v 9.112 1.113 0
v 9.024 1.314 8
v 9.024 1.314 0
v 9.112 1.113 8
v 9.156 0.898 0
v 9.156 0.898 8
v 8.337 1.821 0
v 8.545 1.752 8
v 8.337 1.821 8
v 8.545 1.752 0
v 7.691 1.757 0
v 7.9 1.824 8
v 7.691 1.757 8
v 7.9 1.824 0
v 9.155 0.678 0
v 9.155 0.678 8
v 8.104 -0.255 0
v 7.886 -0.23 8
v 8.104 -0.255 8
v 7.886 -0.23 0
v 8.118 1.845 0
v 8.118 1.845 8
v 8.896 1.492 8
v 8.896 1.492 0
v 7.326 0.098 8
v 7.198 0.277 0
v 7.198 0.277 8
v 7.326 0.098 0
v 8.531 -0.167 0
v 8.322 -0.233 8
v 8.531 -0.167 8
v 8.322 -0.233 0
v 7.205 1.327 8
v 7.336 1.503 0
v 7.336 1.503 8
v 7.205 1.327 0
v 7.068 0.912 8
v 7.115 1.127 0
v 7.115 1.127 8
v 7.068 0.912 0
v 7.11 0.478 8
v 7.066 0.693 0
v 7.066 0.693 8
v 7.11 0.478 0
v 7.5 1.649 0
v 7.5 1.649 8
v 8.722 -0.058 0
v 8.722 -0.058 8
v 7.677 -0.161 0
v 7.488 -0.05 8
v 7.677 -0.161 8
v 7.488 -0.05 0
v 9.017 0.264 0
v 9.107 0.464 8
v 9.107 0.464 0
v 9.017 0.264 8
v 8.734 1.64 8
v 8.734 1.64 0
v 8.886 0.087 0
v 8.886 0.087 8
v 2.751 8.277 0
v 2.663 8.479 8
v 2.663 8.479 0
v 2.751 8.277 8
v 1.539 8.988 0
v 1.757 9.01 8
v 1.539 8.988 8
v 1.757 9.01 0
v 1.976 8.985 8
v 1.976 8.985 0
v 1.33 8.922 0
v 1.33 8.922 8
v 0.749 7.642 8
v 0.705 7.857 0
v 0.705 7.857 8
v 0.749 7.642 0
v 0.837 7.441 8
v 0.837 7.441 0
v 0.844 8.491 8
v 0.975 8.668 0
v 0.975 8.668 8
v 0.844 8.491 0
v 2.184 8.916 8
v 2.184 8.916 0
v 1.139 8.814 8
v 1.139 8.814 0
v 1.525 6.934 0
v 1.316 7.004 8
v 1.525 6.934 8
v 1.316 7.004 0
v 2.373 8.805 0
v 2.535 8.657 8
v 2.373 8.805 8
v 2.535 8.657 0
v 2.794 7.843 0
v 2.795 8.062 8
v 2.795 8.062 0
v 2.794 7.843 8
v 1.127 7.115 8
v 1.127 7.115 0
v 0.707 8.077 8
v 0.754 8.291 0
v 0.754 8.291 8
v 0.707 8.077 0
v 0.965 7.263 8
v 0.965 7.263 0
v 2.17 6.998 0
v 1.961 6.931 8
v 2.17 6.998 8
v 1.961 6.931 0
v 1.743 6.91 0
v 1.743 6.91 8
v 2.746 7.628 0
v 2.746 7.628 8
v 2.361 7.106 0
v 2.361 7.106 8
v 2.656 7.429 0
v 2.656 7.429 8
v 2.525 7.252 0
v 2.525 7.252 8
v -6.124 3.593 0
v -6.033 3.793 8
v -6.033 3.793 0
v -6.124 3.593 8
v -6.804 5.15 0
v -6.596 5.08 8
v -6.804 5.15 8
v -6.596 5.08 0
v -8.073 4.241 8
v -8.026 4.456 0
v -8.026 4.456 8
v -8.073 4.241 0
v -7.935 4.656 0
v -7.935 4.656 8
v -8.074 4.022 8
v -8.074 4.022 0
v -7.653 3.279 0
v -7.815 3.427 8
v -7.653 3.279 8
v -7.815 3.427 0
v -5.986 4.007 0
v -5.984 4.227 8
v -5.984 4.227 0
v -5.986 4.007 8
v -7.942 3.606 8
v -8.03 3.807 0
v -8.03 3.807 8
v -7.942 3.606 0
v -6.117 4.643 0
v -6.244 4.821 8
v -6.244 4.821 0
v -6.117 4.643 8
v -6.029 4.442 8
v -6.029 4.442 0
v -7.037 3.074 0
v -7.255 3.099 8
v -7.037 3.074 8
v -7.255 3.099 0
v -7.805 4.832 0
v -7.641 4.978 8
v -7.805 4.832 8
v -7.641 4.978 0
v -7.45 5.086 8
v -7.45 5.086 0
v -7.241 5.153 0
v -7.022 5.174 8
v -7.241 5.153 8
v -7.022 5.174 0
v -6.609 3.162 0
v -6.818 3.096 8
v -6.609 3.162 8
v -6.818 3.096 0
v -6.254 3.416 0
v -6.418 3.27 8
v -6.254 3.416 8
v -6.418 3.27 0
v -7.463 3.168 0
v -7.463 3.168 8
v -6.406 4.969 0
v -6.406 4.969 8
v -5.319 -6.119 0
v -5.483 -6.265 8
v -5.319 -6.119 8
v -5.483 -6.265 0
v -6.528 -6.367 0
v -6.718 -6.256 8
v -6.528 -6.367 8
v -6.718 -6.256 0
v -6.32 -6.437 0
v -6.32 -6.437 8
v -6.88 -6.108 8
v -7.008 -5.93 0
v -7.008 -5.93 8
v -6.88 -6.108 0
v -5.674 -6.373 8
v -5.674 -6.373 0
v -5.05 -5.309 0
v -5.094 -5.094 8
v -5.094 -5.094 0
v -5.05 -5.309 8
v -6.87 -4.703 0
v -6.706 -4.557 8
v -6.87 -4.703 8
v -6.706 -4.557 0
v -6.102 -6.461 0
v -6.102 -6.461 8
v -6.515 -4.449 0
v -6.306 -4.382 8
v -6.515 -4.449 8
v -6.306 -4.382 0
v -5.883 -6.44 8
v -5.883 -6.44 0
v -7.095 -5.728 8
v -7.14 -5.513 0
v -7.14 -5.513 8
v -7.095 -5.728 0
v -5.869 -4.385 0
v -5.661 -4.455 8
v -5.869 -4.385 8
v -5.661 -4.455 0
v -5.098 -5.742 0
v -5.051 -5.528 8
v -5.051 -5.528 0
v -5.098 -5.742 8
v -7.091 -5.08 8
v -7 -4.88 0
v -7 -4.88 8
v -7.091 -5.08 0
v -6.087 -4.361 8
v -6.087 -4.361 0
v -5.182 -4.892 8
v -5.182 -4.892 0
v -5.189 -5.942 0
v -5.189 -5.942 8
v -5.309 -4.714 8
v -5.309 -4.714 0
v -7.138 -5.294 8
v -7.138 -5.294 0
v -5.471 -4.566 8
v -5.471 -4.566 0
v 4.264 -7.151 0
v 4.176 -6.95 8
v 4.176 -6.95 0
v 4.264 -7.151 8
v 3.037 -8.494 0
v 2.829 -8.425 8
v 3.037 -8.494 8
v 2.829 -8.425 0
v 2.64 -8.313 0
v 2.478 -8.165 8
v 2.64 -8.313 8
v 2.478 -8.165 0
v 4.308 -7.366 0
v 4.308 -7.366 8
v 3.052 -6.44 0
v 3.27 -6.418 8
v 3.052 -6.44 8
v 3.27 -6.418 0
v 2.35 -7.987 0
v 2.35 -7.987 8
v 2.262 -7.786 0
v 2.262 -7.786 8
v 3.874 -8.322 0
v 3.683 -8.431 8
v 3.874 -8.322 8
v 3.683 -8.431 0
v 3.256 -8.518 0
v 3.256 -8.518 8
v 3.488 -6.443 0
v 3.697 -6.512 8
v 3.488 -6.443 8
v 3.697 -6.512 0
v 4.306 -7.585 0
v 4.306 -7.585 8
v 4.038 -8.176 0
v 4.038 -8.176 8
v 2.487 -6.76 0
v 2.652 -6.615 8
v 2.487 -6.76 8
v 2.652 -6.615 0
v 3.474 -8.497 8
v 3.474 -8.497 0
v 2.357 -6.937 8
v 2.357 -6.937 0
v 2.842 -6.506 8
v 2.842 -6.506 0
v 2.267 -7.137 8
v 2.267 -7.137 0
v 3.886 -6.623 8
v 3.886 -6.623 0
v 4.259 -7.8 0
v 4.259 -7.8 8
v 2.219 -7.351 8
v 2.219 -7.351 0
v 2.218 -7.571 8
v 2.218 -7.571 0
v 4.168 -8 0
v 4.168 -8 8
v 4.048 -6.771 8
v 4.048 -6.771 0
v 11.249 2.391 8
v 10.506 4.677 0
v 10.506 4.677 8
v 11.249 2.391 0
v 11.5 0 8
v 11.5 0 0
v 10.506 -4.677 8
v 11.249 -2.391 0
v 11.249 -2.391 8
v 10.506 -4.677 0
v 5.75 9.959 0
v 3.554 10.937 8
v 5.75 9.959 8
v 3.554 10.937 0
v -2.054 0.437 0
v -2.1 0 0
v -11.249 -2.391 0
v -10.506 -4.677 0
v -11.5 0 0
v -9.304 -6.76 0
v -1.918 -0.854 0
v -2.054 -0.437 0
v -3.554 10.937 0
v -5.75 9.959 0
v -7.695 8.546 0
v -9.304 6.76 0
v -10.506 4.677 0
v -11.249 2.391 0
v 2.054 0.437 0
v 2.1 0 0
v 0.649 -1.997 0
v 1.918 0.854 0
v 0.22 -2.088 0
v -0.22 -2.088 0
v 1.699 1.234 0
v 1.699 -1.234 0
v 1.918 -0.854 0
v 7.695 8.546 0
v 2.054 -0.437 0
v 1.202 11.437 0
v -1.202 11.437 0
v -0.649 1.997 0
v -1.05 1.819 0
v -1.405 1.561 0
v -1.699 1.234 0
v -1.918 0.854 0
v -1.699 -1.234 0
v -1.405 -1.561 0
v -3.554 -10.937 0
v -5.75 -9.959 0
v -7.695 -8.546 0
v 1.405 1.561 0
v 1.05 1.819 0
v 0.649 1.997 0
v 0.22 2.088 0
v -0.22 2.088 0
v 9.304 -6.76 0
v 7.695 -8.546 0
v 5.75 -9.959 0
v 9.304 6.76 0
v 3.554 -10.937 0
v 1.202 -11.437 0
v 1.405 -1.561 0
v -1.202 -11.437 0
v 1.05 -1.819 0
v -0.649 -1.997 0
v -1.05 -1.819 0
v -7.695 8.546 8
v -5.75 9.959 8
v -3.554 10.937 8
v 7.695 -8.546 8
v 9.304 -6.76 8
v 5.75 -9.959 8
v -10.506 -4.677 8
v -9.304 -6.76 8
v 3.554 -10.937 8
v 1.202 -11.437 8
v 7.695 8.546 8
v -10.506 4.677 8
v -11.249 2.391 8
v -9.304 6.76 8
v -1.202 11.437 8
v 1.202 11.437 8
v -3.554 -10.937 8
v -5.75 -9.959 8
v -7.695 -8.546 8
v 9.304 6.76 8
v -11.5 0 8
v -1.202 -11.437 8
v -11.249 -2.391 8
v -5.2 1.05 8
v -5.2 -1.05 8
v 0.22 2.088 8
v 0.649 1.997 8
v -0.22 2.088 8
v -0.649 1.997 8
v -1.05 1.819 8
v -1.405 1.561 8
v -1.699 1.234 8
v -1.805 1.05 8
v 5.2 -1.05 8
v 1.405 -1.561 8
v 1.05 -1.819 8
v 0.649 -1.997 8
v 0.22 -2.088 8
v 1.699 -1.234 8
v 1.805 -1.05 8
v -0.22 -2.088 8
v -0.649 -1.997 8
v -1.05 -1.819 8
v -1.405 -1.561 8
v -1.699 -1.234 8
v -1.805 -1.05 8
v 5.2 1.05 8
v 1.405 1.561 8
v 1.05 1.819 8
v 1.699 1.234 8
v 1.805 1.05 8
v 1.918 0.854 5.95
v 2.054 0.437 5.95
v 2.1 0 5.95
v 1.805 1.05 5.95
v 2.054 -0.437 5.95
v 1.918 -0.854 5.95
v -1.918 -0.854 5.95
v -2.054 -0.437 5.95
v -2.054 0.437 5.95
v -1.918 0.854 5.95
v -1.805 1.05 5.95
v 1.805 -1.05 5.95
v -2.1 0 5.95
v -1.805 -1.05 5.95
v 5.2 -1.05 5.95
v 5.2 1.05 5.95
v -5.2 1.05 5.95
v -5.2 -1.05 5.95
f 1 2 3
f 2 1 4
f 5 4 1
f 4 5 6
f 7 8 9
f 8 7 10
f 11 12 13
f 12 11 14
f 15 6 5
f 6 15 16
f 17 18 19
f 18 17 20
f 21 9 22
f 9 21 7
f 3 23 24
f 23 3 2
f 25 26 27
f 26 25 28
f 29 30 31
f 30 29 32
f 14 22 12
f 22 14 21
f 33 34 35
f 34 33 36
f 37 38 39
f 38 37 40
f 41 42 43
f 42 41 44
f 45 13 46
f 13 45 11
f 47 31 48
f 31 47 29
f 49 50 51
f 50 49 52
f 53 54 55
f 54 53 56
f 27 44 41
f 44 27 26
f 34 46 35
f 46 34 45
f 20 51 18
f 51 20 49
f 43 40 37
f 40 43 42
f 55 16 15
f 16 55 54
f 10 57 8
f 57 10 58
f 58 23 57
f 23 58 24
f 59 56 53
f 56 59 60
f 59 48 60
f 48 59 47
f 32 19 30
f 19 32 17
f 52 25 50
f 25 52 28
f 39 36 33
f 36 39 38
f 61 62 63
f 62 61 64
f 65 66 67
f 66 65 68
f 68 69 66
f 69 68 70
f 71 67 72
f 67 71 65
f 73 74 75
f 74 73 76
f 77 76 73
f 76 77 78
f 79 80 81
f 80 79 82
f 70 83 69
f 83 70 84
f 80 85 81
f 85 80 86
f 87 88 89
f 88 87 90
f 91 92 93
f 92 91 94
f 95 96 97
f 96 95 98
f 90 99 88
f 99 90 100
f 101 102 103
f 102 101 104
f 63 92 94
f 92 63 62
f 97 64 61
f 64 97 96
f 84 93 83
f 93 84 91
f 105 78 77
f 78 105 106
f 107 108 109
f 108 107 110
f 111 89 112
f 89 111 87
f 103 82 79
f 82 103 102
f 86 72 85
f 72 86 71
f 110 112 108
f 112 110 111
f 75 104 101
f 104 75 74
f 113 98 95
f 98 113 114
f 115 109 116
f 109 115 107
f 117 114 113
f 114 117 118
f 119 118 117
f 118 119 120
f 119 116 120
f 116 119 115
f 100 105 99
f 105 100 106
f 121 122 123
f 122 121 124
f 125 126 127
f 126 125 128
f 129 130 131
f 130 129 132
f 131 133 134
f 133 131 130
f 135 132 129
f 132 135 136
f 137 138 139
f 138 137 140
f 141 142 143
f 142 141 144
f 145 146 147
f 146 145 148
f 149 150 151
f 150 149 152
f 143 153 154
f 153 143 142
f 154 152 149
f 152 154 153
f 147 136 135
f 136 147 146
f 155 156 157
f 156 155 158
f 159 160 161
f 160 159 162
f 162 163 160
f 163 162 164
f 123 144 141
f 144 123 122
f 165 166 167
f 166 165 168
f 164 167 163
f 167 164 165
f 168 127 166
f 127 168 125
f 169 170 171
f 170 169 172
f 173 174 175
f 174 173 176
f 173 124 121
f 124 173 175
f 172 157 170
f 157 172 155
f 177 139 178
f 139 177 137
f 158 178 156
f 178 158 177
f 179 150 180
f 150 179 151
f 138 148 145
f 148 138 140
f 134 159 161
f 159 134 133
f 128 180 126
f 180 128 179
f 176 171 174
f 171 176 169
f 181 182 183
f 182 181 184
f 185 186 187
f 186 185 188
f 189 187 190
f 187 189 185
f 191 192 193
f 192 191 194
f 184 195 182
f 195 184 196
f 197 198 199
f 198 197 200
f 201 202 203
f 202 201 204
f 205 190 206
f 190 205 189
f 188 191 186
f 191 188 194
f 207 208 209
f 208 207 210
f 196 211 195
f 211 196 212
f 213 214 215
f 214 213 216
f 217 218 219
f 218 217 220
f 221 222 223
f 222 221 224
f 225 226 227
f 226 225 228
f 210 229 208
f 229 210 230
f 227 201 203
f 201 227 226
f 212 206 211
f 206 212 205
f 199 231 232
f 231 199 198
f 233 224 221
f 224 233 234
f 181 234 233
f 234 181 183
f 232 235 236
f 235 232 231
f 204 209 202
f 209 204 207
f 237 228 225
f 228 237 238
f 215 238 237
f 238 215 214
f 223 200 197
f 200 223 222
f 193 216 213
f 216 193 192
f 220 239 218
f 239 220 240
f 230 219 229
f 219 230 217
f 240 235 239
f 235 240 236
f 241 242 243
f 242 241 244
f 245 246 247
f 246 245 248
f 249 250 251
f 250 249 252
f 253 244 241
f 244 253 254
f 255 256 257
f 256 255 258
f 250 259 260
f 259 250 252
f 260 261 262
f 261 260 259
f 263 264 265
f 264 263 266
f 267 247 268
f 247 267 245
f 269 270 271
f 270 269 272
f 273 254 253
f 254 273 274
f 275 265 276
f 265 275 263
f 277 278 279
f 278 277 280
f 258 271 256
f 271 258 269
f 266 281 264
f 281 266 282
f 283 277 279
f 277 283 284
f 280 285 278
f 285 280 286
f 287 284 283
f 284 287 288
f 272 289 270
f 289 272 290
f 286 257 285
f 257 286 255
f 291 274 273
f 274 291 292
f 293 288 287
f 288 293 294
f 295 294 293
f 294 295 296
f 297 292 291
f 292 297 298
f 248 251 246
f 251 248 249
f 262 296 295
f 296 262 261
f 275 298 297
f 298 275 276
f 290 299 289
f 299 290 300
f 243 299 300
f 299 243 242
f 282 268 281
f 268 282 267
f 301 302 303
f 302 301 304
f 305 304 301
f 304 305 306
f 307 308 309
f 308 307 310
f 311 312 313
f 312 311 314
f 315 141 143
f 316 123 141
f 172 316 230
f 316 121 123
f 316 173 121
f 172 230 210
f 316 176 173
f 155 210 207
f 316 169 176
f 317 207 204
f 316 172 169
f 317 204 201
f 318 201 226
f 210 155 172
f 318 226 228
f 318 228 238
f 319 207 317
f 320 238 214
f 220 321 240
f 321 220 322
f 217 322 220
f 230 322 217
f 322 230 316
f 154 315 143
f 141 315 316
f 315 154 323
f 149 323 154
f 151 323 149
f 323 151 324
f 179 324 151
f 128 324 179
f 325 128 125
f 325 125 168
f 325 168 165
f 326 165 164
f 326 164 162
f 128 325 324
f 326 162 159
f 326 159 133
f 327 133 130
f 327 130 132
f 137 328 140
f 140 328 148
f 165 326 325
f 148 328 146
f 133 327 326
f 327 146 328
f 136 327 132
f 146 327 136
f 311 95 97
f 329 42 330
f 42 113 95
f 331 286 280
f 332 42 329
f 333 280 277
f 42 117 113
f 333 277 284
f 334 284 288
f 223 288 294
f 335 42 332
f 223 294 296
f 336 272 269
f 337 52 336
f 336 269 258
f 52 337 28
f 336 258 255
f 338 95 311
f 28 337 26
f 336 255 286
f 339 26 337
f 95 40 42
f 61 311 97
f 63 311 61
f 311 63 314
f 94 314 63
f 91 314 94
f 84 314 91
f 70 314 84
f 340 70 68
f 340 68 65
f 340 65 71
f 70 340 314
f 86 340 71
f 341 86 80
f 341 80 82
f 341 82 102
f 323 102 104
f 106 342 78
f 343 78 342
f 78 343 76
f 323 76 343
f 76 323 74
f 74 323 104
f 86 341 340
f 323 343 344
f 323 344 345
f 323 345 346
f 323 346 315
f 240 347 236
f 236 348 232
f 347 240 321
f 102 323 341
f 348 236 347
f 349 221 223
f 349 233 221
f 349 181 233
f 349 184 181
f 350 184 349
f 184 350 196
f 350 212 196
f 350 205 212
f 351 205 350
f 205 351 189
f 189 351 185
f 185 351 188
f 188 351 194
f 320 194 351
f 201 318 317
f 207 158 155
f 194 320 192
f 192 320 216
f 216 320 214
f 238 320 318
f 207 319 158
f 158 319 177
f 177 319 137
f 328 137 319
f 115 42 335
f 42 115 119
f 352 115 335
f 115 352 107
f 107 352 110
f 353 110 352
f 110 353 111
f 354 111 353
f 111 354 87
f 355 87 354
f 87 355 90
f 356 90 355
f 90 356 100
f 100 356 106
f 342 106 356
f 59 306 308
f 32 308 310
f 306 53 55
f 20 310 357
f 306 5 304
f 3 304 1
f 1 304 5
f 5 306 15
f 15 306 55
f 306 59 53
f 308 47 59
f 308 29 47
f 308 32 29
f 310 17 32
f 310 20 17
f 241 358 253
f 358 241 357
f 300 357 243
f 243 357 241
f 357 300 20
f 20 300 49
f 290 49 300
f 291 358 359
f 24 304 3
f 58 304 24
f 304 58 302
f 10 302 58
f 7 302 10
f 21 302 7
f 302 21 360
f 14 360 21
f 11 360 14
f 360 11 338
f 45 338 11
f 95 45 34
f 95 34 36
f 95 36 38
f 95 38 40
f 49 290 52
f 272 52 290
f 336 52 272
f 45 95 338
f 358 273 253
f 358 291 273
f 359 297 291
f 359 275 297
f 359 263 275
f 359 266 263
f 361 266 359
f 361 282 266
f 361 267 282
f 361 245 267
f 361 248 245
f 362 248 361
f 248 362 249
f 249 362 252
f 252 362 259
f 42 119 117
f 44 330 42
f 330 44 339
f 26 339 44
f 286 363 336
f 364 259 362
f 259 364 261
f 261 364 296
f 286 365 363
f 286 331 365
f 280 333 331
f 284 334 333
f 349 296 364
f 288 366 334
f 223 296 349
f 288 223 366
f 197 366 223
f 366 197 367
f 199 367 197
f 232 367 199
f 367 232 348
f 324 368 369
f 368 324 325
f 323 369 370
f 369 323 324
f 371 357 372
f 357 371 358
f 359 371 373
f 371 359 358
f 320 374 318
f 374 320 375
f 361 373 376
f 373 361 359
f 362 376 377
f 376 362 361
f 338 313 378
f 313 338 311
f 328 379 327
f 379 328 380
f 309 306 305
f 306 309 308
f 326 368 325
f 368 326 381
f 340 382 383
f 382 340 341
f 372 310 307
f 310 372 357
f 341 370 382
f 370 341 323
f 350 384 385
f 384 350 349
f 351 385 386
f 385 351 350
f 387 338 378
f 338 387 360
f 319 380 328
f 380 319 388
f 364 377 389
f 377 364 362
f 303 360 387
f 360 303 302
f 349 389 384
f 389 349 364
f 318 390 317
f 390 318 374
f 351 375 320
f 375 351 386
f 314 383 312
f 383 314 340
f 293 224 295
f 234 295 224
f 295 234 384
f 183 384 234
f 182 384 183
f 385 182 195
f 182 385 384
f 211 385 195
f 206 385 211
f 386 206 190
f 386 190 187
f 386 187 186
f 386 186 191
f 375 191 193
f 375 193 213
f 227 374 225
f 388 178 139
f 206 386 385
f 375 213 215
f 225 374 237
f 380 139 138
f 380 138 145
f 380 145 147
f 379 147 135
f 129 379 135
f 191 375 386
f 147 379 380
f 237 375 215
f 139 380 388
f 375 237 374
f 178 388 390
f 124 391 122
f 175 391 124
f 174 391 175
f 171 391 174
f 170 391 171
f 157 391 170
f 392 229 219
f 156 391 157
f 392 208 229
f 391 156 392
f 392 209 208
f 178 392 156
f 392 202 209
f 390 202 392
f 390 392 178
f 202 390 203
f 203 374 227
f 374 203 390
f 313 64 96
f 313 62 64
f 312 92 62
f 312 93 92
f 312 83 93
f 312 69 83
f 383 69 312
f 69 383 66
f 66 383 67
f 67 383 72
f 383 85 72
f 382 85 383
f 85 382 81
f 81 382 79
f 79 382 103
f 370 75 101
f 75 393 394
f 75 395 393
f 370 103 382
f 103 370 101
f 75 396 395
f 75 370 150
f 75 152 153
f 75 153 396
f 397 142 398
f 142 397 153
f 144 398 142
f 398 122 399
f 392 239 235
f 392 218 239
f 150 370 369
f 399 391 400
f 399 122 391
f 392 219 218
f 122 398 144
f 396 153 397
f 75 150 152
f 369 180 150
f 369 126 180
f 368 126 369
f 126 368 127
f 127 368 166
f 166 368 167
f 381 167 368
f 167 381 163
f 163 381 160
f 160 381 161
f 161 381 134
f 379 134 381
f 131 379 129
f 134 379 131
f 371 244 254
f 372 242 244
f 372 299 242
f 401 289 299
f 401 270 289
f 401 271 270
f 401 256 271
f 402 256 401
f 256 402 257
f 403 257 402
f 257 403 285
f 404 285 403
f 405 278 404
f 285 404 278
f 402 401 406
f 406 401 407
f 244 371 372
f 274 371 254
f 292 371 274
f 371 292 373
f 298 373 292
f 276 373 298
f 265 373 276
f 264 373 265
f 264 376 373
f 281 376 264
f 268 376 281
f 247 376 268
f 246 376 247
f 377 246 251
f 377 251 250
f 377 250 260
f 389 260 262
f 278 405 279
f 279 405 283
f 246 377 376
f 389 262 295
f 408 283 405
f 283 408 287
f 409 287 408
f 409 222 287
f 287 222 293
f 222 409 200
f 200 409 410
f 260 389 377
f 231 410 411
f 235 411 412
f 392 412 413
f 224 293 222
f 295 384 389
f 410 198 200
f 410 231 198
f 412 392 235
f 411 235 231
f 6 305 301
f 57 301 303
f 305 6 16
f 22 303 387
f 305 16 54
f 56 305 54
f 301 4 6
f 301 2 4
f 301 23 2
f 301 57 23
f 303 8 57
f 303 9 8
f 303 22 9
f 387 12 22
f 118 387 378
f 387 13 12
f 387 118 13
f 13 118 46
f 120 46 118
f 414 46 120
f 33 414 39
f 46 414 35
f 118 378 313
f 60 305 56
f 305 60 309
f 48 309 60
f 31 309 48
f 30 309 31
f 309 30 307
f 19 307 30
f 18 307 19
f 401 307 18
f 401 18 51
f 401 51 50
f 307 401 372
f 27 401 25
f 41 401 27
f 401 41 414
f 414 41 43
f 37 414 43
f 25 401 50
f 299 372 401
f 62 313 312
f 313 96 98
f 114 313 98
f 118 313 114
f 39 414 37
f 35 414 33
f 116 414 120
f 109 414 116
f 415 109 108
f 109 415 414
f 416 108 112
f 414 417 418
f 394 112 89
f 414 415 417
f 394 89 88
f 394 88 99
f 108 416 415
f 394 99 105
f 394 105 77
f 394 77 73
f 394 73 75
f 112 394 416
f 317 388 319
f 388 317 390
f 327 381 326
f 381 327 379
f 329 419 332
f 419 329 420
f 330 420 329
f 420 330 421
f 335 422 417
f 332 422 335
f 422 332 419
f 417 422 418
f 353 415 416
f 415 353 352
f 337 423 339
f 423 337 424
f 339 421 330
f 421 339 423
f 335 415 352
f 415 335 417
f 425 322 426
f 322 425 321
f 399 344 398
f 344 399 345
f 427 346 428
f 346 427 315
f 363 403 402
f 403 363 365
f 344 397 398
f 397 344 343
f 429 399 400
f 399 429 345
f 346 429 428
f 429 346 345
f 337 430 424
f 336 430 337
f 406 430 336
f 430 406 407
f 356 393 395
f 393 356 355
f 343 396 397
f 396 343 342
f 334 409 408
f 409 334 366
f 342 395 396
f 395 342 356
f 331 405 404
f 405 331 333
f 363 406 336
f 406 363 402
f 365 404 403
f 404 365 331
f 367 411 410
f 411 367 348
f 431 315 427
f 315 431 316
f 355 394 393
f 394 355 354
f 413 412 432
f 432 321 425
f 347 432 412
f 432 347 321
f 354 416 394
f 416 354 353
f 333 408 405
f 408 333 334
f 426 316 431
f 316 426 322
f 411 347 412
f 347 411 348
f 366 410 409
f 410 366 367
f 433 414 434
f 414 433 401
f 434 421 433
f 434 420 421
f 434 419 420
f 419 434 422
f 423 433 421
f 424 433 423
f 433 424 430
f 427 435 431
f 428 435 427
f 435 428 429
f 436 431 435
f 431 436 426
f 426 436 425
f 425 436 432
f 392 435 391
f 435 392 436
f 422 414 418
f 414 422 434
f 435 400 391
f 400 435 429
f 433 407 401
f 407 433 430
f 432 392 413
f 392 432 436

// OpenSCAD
width = 6; //[1:0.5:25]
style = "pin"; //[pin:Pin, hex:Hex]

/* [Hidden] */

hex_radius = 6 / sin(60) + 0.13;
hex_depth = 4;

height = style == "hex" ? width + hex_depth : width + 2;

base_radius = 23 / 2;

mounting_hole_radius = 16.3 / 2;

difference() {

    //base
    cylinder(r = base_radius, h = height, $fs = 0.1);
    
    //center hole
    translate([0, 0, -1])
        cylinder(r = 2.1, h = height + 2, $fs = 0.1);
    
    if(style == "hex") {
        //hex
        translate([0, 0, width])
            cylinder(r = hex_radius, h = hex_depth + 1, $fn = 6);
        
        //rounded hex corners
        for(i = [0 : 5]) {
            rotate([0 ,0, i * 60])
                translate([hex_radius-0.25, 0, width])
                    cylinder(r = 0.5, h = hex_depth + 1, $fs = 0.1);
        }
    } else if(style == "pin") {
        translate([0,0,height-1])
            cube([10.4,2.1,2.1],center=true);
    }

    //m2.5 screw holes, 2.1mm for making threads with the screw
    for(i = [0 : 4]) {
        //add 5.6 degrees to get as far from hex corners as possible
        rotate([0 ,0, i * 360 / 5 + 5.6])
            translate([mounting_hole_radius, 0, -1])
                cylinder(d=2.1, h = height+2, $fs = 0.1);
    }


}
